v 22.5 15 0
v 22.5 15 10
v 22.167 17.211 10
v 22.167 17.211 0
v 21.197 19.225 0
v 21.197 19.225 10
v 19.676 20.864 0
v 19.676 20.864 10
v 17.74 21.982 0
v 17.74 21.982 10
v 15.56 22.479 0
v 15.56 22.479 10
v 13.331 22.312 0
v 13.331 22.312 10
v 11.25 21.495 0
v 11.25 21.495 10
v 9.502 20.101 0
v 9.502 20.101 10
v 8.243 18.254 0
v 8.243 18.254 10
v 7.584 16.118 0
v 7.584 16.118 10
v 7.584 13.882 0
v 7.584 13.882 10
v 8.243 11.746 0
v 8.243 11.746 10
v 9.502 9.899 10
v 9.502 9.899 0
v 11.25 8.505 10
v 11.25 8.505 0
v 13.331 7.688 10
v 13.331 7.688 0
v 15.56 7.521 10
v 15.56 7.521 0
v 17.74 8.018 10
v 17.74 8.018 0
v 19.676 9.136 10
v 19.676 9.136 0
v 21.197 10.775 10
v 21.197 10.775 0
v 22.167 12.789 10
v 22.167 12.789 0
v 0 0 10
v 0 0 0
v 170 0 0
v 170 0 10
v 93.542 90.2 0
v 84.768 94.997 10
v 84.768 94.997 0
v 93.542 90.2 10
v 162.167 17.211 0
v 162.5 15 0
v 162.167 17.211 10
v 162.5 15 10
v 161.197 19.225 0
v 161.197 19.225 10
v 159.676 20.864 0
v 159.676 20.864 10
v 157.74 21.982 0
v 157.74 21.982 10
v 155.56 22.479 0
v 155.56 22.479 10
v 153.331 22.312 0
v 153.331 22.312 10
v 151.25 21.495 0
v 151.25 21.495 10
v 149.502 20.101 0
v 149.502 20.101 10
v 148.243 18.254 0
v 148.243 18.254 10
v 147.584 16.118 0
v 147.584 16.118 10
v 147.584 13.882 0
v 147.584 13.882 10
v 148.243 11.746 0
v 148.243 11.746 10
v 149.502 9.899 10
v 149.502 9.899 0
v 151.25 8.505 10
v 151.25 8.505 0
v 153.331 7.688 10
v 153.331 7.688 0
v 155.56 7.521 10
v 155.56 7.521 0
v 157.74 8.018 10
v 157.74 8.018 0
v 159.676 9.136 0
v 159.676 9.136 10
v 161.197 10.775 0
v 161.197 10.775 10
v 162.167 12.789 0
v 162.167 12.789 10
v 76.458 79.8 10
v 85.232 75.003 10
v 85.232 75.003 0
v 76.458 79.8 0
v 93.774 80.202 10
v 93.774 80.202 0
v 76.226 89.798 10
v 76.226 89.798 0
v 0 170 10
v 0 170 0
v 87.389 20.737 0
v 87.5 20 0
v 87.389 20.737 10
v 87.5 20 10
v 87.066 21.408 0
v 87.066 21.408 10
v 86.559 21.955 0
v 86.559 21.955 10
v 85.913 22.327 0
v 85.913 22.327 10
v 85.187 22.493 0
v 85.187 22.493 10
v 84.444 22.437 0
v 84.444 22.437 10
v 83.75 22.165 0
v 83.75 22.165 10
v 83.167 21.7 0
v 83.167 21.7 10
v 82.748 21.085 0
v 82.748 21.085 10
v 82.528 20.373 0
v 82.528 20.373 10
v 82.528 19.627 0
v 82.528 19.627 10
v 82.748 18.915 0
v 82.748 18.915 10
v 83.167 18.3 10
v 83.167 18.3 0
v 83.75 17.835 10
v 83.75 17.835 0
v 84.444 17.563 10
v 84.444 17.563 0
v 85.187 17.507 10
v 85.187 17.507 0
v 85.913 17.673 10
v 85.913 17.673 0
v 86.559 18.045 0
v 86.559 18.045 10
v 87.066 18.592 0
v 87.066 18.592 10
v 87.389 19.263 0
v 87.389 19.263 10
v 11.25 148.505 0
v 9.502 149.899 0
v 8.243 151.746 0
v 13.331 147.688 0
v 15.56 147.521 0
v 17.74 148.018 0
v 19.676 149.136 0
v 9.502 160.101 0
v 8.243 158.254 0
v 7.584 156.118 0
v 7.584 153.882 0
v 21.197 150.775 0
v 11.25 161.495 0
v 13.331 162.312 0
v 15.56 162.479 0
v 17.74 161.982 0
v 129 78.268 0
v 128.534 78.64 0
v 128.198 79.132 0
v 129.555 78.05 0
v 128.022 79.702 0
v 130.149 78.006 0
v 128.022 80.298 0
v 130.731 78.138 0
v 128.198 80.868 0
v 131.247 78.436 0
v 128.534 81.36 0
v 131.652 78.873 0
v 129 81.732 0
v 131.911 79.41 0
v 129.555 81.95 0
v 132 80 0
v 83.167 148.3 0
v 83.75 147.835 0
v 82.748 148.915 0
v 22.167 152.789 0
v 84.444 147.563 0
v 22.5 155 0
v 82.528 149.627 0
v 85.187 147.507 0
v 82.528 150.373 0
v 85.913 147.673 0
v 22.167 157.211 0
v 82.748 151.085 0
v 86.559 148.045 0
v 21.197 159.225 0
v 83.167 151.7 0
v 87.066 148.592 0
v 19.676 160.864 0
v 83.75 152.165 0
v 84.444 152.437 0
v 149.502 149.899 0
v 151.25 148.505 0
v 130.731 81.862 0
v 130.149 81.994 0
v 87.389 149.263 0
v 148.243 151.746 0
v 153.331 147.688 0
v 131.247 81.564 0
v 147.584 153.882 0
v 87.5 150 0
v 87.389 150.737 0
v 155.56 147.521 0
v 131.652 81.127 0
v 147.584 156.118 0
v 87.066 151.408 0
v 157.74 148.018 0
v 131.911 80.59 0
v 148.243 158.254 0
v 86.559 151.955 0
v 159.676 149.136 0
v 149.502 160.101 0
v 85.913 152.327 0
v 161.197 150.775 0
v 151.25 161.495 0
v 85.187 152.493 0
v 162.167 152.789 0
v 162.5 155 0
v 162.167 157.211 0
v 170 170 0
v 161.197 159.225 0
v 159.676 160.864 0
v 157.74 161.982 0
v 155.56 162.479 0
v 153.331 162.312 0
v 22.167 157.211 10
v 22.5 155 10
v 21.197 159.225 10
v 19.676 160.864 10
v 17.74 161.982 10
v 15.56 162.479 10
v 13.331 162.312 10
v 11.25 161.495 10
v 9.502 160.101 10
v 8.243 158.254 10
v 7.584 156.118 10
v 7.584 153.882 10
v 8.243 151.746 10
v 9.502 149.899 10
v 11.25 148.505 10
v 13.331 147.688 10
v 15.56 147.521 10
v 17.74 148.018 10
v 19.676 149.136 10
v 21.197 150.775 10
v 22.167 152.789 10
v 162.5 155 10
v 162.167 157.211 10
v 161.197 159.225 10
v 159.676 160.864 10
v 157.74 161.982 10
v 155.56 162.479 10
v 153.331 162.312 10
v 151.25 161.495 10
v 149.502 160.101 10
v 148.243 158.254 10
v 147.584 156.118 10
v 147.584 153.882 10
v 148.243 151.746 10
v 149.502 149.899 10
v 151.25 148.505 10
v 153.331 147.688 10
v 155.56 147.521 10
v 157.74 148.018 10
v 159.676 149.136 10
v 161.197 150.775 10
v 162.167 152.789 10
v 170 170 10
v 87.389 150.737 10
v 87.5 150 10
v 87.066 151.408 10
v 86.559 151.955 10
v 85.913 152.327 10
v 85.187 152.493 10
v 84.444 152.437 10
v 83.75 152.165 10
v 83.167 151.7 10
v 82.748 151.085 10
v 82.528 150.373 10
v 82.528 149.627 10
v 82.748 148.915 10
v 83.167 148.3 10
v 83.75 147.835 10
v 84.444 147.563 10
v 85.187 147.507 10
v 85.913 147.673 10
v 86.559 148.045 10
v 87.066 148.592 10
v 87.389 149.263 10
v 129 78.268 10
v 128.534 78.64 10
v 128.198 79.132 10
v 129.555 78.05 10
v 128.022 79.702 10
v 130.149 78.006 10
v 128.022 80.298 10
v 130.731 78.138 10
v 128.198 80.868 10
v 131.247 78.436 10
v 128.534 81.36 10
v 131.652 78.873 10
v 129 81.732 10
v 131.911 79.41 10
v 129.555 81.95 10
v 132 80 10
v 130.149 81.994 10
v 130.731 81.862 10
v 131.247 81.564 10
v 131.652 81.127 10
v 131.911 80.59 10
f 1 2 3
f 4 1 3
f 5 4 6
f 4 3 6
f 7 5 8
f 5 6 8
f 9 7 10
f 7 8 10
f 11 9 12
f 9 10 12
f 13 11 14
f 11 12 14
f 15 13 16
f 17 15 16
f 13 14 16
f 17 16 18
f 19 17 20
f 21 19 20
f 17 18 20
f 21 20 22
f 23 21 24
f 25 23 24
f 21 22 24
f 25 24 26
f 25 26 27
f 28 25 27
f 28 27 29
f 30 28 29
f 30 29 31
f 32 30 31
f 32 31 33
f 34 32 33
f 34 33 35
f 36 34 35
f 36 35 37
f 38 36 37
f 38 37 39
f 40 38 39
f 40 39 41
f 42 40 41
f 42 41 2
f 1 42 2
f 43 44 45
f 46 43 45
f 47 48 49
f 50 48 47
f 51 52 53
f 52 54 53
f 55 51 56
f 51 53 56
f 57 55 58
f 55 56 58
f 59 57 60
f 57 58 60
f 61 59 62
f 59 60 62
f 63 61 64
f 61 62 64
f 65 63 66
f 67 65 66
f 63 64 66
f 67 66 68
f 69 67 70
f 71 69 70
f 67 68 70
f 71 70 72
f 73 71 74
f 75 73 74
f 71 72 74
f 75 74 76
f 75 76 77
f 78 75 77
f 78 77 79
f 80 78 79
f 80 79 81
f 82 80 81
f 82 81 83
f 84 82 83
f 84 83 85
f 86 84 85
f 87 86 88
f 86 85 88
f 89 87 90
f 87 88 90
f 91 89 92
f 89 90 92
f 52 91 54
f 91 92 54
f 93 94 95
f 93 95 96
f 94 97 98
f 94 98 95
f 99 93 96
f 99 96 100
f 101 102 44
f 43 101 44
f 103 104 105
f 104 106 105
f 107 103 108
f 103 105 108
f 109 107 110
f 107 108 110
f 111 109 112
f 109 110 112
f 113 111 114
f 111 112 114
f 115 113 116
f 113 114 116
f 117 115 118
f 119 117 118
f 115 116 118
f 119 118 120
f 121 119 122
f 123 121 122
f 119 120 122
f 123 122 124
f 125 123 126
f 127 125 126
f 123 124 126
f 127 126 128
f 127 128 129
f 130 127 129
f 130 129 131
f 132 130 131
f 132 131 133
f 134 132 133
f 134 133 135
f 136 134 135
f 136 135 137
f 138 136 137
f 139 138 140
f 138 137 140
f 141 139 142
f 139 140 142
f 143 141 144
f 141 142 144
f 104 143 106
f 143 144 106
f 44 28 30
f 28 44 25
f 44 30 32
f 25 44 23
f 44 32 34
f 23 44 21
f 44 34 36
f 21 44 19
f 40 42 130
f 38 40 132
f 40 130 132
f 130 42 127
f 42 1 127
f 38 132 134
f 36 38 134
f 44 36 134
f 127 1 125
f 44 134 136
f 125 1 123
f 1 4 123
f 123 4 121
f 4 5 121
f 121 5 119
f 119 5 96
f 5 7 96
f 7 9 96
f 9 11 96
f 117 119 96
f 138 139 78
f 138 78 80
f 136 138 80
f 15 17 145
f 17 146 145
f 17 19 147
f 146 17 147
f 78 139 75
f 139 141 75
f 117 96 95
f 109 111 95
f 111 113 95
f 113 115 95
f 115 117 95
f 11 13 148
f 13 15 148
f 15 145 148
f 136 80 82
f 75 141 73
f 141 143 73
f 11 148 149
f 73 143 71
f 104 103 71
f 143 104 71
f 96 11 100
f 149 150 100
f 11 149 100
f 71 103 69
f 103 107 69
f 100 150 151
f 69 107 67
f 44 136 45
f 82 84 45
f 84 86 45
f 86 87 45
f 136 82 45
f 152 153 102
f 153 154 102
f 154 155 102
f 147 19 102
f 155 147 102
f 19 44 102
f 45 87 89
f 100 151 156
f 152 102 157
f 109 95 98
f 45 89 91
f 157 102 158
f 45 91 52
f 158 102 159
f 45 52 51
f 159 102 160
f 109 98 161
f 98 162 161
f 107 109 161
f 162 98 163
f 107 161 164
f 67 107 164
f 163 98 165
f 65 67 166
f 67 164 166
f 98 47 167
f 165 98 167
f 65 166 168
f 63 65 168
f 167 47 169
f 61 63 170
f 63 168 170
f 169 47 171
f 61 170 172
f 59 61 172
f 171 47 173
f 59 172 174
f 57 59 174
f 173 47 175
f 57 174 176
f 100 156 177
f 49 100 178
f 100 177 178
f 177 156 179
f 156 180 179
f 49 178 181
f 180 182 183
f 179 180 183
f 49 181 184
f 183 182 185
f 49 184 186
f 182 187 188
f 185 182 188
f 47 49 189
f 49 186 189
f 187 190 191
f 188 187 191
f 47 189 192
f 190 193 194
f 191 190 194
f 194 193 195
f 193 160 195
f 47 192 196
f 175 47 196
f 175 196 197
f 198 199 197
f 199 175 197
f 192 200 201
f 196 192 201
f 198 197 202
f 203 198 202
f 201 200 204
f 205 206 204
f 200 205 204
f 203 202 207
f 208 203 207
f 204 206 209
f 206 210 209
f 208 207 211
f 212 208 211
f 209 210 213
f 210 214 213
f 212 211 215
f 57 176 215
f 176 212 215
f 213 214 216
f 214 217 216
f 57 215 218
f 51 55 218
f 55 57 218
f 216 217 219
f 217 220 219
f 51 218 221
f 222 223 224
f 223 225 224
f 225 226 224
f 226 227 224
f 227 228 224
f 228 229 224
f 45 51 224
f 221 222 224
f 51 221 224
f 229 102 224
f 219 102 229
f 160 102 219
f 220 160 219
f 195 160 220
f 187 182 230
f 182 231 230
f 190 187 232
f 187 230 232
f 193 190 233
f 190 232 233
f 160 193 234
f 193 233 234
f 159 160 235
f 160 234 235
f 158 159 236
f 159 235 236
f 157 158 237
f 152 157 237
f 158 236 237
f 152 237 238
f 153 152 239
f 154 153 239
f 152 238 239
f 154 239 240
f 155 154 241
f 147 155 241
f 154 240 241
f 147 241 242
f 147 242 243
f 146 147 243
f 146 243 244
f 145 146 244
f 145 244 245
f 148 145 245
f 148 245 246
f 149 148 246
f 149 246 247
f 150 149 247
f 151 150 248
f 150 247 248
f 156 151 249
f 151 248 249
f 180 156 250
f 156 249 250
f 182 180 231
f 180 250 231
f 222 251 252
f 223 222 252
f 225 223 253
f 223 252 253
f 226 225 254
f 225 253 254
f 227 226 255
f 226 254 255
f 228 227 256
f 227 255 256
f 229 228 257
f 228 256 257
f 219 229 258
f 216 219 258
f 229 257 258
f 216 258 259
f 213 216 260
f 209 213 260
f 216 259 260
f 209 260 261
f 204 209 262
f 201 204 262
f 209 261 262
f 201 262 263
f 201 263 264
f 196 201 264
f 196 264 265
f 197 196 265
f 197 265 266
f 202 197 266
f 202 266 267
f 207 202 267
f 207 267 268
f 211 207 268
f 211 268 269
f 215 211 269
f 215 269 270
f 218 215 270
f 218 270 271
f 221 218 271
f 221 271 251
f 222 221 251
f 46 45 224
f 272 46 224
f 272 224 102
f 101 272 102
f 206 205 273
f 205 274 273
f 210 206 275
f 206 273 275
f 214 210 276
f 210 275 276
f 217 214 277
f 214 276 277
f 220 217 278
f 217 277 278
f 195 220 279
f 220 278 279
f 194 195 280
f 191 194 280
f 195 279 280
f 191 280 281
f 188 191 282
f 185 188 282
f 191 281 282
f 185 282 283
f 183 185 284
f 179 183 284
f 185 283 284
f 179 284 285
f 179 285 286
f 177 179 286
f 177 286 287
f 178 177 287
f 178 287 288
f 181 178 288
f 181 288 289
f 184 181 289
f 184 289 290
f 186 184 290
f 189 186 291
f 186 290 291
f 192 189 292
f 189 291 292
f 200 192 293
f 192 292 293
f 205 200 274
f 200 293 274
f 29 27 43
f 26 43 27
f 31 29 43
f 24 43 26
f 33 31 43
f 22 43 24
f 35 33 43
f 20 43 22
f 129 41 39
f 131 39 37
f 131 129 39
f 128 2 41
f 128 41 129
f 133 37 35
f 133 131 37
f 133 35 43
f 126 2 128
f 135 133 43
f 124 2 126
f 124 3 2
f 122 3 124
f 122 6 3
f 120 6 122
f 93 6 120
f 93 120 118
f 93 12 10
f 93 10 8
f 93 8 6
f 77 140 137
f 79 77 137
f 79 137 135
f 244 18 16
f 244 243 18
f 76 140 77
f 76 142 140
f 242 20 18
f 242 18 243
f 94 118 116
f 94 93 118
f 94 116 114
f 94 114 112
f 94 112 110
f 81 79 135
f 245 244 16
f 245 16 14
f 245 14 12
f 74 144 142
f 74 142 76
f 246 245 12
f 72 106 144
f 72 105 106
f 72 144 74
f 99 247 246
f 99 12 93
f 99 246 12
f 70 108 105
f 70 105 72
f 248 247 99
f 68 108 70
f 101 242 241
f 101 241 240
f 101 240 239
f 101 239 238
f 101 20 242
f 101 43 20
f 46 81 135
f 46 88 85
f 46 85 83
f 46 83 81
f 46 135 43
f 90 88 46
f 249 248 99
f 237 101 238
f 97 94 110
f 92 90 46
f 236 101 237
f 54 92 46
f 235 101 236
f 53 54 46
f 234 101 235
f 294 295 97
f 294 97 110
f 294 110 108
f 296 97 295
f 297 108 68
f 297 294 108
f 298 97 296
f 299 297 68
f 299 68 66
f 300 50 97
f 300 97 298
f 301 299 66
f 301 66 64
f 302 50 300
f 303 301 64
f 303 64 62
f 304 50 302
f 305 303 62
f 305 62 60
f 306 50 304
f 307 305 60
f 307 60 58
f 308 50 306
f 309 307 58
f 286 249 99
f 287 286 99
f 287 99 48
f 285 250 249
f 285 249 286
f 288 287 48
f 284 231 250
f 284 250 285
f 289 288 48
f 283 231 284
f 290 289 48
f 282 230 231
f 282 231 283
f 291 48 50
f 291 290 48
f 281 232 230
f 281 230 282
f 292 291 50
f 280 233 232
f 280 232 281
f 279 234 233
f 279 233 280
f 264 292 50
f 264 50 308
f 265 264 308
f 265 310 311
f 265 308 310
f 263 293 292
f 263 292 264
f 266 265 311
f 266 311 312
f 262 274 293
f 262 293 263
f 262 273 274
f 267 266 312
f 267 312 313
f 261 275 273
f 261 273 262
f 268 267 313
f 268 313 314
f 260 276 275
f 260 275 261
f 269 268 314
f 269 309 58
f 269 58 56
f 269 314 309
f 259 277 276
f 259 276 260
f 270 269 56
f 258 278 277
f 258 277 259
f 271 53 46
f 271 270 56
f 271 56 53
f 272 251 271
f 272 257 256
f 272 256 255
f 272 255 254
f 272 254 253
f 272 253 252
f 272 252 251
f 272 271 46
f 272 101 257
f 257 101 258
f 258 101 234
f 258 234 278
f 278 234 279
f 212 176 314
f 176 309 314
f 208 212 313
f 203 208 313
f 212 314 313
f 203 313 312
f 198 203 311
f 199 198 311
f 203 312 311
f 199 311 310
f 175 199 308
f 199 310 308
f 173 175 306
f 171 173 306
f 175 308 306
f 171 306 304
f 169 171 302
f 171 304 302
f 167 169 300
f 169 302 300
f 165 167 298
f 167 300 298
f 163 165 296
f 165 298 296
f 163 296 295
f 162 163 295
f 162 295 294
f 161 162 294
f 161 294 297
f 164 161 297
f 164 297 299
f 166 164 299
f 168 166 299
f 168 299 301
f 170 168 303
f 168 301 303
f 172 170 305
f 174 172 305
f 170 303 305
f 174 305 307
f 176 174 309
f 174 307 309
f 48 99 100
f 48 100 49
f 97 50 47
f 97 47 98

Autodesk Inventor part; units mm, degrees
ref_plane "YZ Plane" through (0, 0, 0) normal (1, 0, 0) x (0, 1, 0)
ref_plane "XZ Plane" through (0, 0, 0) normal (0, 1, 0) x (-1, 0, 0)
ref_plane "XY Plane" through (0, 0, 0) normal (0, 0, 1) x (1, 0, 0)
sketch "Sketch1" plane through (0, 0, 0) normal (0, 0, 1) x (1, 0, 0)
  line L0 (0, 0) -> (170, 0)
  line L1 (170, 0) -> (170, 170)
  line L2 (170, 170) -> (0, 170)
  line L3 (0, 170) -> (0, 0)
  dimension "d0" = 170
  dimension "d1" = 170
extrude "Extrusion1" add sketch "Sketch1" along normal blind 10
sketch "Sketch2" plane through (0, 0, 10) normal (0, 0, 1) x (1, 0, 0)
  line L0 (170, 170) -> (0, 170) projected
  line L1 (0, 170) -> (0, 155)
  line L2 (0, 170) -> (0, 0) projected
  line L3 (0, 0) -> (170, 0) projected
  line L4 (0, 0) -> (0, 15)
  line L5 (0, 15) -> (155, 15)
  line L6 (155, 15) -> (155, 155)
  line L7 (155, 155) -> (15, 155)
  line L8 (15, 155) -> (15, 15)
  line L9 (15, 155) -> (30, 155)
  circle A0 centre (15, 155) radius 7.5
  circle A1 centre (155, 155) radius 7.5
  circle A2 centre (155, 15) radius 7.5
  circle A3 centre (15, 15) radius 7.5
  dimension "d4" = 15
  dimension "d5" = 15
  dimension "d6" = 155
  dimension "d7" = 140
  dimension "d8" = 140
  dimension "d9" = 140
  dimension "d10" = 15
  dimension "d11" = 15
  dimension "d12" = 15
  dimension "d13" = 15
extrude "Extrusion2" cut sketch "Sketch2" against normal blind 10 contours L8 A3 L5 | L5 A3 | L5 A3 L8 | A2 L6 L5 | L5 L6 A2 | A0 L7 L8 | L8 L7 A0 | A1 L7 L6 | L6 L7 A1
sketch "Sketch3" plane through (0, 0, 10) normal (0, 0, 1) x (1, 0, 0)
  line L0 (170, 170) -> (0, 170) projected
  line L1 (0, 170) -> (85, 170)
  line L2 (85, 170) -> (85, 85)
  line L3 (93.542, 90.1995) -> (93.7739, 80.2022)
  line L4 (93.7739, 80.2022) -> (85.2319, 75.0027)
  line L5 (85.2319, 75.0027) -> (76.458, 79.8005)
  line L6 (76.458, 79.8005) -> (76.2261, 89.7978)
  line L7 (76.2261, 89.7978) -> (84.7681, 94.9973)
  line L8 (84.7681, 94.9973) -> (93.542, 90.1995)
  point P0 (0, 0)
  dimension "d16" = 85
  dimension "d17" = 85
  dimension "d18" = 10
extrude "Extrusion3" cut sketch "Sketch3" against normal blind 10
sketch "Sketch4" plane through (0, 0, 10) normal (0, 0, 1) x (1, 0, 0)
  line L0 (170, 170) -> (0, 170) projected
  line L1 (0, 170) -> (85, 170)
  line L2 (85, 170) -> (85, 150)
  line L3 (85, 150) -> (85, 20)
  circle A0 centre (85, 150) radius 2.5
  circle A1 centre (85, 20) radius 2.5
  point P0 (0, 0)
  dimension "d21" = 85
  dimension "d22" = 20
  dimension "d23" = 130
  dimension "d24" = 5
  dimension "d25" = 5
extrude "Extrusion4" cut sketch "Sketch4" against normal blind 10
sketch "Sketch5" plane through (0, 0, 10) normal (0, 0, 1) x (1, 0, 0)
  line L0 (170, 0) -> (170, 170) projected
  line L1 (170, 0) -> (170, 80)
  line L2 (170, 80) -> (130, 80)
  circle A0 centre (130, 80) radius 2
  point P0 (0, 0)
  dimension "d28" = 80
  dimension "d29" = 40
  dimension "d30" = 4
extrude "Extrusion5" cut sketch "Sketch5" against normal blind 10
properties part number "AY"
